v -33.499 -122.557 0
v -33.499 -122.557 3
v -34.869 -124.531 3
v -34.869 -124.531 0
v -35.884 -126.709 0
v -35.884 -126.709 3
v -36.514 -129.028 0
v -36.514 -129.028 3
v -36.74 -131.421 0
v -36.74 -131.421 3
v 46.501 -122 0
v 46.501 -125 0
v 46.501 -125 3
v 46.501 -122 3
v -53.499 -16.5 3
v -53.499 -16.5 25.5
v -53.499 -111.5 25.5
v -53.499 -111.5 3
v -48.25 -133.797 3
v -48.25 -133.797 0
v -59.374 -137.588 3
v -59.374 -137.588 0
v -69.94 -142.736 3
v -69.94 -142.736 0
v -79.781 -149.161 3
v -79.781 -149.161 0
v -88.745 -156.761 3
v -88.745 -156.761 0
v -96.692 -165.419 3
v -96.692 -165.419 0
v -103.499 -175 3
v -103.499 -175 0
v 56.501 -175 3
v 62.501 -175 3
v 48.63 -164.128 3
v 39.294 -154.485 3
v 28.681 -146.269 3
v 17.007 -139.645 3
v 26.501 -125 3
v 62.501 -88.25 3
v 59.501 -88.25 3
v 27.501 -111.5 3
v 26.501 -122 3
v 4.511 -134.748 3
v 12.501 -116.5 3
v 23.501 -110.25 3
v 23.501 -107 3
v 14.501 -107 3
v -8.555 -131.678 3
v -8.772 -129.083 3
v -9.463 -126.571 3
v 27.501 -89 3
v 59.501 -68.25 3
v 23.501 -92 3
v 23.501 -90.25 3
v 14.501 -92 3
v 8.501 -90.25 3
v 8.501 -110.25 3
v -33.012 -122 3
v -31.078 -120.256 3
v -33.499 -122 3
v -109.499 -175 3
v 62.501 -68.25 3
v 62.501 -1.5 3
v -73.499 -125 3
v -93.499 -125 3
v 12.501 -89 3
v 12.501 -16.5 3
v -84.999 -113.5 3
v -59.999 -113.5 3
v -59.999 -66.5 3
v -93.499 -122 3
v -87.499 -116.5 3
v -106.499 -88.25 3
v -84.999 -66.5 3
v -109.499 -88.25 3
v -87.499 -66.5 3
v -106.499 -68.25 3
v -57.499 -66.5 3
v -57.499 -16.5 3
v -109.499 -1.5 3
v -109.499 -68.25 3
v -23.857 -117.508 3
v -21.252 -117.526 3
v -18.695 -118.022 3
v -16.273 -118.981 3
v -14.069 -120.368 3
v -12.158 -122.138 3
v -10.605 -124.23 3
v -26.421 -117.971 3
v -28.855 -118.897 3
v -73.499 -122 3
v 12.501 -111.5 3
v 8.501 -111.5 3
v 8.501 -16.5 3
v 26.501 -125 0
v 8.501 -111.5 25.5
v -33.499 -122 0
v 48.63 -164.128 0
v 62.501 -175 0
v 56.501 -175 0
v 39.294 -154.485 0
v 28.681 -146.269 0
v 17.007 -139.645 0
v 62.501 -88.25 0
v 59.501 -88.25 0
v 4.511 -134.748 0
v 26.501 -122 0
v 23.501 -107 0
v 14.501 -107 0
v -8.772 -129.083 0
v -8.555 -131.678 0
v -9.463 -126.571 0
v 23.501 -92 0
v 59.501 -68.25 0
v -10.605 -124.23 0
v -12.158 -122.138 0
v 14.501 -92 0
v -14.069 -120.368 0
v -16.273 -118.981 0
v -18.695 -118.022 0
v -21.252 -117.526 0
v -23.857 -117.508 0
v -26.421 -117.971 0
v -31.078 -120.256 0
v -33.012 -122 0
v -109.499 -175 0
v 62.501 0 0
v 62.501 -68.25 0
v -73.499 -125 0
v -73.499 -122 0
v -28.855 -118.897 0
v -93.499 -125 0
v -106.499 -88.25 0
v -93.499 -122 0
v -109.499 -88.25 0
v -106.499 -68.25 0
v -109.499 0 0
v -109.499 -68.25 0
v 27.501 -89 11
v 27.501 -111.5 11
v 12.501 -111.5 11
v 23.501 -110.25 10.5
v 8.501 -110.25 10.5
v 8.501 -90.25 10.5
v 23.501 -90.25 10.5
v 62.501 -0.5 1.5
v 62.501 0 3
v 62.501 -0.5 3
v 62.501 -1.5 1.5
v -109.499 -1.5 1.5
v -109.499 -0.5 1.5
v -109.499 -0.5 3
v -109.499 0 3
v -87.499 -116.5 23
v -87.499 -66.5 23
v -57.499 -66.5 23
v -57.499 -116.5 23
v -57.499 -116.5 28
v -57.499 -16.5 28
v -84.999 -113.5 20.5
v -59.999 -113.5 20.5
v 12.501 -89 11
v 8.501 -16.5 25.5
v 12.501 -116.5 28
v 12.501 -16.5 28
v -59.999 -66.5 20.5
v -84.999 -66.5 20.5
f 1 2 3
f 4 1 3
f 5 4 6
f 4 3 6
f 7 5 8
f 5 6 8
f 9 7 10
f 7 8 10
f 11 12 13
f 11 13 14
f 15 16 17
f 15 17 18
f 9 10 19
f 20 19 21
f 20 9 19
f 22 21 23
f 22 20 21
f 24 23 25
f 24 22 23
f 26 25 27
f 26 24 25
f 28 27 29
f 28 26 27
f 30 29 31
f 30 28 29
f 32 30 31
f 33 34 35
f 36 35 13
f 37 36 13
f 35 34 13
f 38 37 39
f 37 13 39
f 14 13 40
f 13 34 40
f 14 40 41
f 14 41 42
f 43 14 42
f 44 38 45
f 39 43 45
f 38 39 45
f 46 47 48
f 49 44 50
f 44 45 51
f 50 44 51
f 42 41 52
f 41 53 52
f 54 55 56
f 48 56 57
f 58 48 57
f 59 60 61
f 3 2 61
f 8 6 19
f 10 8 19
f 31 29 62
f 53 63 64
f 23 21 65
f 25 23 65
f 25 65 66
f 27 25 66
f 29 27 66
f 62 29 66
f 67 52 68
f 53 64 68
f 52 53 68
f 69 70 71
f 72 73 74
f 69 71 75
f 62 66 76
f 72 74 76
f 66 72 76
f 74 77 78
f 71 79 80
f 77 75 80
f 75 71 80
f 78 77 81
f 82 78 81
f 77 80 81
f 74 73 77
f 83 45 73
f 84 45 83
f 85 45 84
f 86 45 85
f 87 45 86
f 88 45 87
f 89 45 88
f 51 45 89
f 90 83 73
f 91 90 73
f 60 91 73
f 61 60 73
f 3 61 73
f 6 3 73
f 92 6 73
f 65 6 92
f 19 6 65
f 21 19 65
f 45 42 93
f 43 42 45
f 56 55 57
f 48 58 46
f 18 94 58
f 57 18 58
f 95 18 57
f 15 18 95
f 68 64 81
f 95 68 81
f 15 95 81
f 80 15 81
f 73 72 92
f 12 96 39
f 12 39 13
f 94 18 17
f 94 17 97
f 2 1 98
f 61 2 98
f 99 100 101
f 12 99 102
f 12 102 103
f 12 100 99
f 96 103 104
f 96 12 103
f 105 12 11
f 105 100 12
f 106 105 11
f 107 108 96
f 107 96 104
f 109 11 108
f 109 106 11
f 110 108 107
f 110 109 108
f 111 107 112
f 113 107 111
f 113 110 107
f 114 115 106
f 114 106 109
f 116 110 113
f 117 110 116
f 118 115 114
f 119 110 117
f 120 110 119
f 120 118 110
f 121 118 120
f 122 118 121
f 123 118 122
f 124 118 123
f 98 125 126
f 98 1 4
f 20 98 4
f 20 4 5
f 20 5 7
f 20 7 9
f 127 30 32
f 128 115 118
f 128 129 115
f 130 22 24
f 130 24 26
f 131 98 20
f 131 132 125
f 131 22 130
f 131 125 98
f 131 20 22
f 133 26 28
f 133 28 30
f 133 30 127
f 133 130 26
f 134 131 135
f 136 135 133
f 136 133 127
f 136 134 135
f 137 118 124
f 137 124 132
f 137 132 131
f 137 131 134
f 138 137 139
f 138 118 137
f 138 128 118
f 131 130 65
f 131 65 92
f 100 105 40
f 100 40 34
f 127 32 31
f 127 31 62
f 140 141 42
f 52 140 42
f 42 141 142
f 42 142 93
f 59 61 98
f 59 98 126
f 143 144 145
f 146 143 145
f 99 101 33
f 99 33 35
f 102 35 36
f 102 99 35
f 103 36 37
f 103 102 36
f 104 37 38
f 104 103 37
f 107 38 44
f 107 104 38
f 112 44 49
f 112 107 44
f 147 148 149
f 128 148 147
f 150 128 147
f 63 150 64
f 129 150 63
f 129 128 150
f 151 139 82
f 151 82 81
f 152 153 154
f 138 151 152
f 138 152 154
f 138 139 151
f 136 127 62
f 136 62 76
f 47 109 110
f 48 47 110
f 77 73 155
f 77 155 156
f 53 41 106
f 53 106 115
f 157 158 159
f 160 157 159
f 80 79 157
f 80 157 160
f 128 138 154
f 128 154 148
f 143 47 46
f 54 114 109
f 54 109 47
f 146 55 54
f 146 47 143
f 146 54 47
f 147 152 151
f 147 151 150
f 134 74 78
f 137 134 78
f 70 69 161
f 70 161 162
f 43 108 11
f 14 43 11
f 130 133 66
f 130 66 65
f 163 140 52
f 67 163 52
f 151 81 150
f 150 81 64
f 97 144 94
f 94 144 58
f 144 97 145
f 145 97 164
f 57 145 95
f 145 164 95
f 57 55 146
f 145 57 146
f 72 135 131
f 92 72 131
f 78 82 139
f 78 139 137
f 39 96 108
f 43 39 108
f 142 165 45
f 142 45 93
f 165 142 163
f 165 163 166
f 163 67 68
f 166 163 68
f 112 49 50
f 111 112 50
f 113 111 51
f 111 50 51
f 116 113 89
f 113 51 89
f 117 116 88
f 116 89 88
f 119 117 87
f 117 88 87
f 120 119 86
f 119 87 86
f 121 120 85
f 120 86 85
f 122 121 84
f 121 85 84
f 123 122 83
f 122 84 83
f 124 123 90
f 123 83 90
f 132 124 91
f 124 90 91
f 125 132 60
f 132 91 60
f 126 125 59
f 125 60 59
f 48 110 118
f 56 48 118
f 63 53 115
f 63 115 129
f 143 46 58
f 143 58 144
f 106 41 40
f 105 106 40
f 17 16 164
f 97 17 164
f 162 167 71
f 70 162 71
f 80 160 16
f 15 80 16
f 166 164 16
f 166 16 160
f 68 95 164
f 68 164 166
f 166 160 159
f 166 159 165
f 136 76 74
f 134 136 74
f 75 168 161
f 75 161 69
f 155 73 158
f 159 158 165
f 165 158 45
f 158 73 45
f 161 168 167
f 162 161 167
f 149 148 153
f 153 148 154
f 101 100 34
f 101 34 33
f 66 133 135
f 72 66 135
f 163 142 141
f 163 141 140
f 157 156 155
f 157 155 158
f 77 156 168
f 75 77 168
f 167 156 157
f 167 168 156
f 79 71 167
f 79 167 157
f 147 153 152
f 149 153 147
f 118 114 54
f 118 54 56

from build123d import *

# Parameters (mm, degrees)
ESQUISSE1_W             = 20
ESQUISSE1_H             = 3
BOSS_EXTRU_1_DEPTH      = 3
ESQUISSE2_W             = 172
ESQUISSE2_H             = 1
ENL_V_MAT_EXTRU_1_DEPTH = 1.5
ESQUISSE4_W             = 3
ESQUISSE4_H             = 20
ENL_V_MAT_EXTRU_2_DEPTH = 207.455986147
ESQUISSE5_W             = 70
ESQUISSE5_H             = 100
BOSS_EXTRU_2_DEPTH      = 25
ESQUISSE6_W             = 62
ESQUISSE6_H             = 22.5
ENL_V_MAT_EXTRU_3_DEPTH = 95
ESQUISSE10_W            = 30
ESQUISSE10_H            = 50
BOSS_EXTRU_3_DEPTH      = 20
ESQUISSE11_W            = 25
ESQUISSE11_H            = 17.5
ENL_V_MAT_EXTRU_5_DEPTH = 47
ESQUISSE12_W            = 8
ESQUISSE12_H            = 22.5
BOSS_EXTRU_5_DEPTH      = 15
ESQUISSE15_W            = 7.5
ESQUISSE15_H            = 20
ENL_V_MAT_EXTRU_7_DEPTH = 15
ENL_V_MAT_EXTRU_8_REACH = 210.324
ESQUISSE17_W            = 9
ESQUISSE17_H            = 15
ENL_V_MAT_EXTRU_9_DEPTH = 10


with BuildPart() as part:
    # Esquisse1 → Boss.-Extru.1 (new body)
    with BuildSketch(Plane.XY):
        with BuildLine():
            Line((-109.499197329, 0), (62.500802671, 0))
            Line((62.500802671, 0), (62.500802671, -175))
            Line((62.500802671, -175), (56.500802671, -175))
            ThreePointArc((56.500802671, -175), (-23.499197329, -130.484780132), (-103.499197329, -175))
            Line((-103.499197329, -175), (-109.499197329, -175))
            Line((-109.499197329, -175), (-109.499197329, 0))
        make_face()
        with Locations((-83.499197329, -123.5)):
            Rectangle(ESQUISSE1_W, ESQUISSE1_H, mode=Mode.SUBTRACT)
        with Locations((-23.499197329, -123.5)):
            Rectangle(ESQUISSE1_W, ESQUISSE1_H, mode=Mode.SUBTRACT)
        with Locations((36.500802671, -123.5)):
            Rectangle(ESQUISSE1_W, ESQUISSE1_H, mode=Mode.SUBTRACT)
    extrude(amount=BOSS_EXTRU_1_DEPTH)

    # Esquisse2 → Enlèv. mat.-Extru.1 (cut)
    with BuildSketch(Plane.XY.offset(3)):
        with Locations((-23.499197329, -1)):
            Rectangle(ESQUISSE2_W, ESQUISSE2_H)
    extrude(amount=-ENL_V_MAT_EXTRU_1_DEPTH, mode=Mode.SUBTRACT)

    # Esquisse4 → Enlèv. mat.-Extru.2 (cut, through all)
    with BuildSketch(Plane.XY.offset(3)):
        with Locations((-107.999197329, -78.25)):
            Rectangle(ESQUISSE4_W, ESQUISSE4_H)
        with Locations((61.000802671, -78.25)):
            Rectangle(ESQUISSE4_W, ESQUISSE4_H)
    extrude(amount=-ENL_V_MAT_EXTRU_2_DEPTH, mode=Mode.SUBTRACT)

    # Esquisse5 → Boss.-Extru.2 (add)
    with BuildSketch(Plane.XY.offset(3)):
        with Locations((-22.499197329, -66.5)):
            Rectangle(ESQUISSE5_W, ESQUISSE5_H)
    extrude(amount=BOSS_EXTRU_2_DEPTH)

    # Esquisse6 → Enlèv. mat.-Extru.3 (cut)
    with BuildSketch(Plane(origin=(0, -16.5, 0), x_dir=(1, 0, 0), z_dir=(0, 1, 0))):
        with Locations((-22.499197329, -14.25)):
            Rectangle(ESQUISSE6_W, ESQUISSE6_H)
    extrude(amount=-ENL_V_MAT_EXTRU_3_DEPTH, mode=Mode.SUBTRACT)

    # Esquisse10 → Boss.-Extru.3 (add)
    with BuildSketch(Plane.XY.offset(3)):
        with Locations((-72.499197329, -91.5)):
            Rectangle(ESQUISSE10_W, ESQUISSE10_H)
    extrude(amount=BOSS_EXTRU_3_DEPTH)

    # Esquisse11 → Enlèv. mat.-Extru.5 (cut)
    with BuildSketch(Plane(origin=(0, -66.5, 0), x_dir=(1, 0, 0), z_dir=(0, 1, 0))):
        with Locations((-72.499197329, -11.75)):
            Rectangle(ESQUISSE11_W, ESQUISSE11_H)
    extrude(amount=-ENL_V_MAT_EXTRU_5_DEPTH, mode=Mode.SUBTRACT)

    # Esquisse12 → Boss.-Extru.5 (add)
    with BuildSketch(Plane(origin=(12.500802671, 0, 0), x_dir=(0, 0, -1), z_dir=(1, 0, 0))):
        with Locations((-7, -100.25)):
            Rectangle(ESQUISSE12_W, ESQUISSE12_H)
    extrude(amount=BOSS_EXTRU_5_DEPTH)

    # Esquisse15 → Enlèv. mat.-Extru.7 (cut)
    with BuildSketch(Plane.ZY.offset(-8.500802671)):
        with Locations((6.75, -100.25)):
            Rectangle(ESQUISSE15_W, ESQUISSE15_H)
    extrude(amount=-ENL_V_MAT_EXTRU_7_DEPTH, mode=Mode.SUBTRACT)

    # Esquisse17 → Enlèv. mat.-Extru.8 (cut, up to next)
    with BuildSketch(Plane(origin=(0, 0, 0), x_dir=(-1, 0, 0), z_dir=(0, 0, -1)), mode=Mode.PRIVATE) as enl_v_mat_extru_8_sk1:
        with Locations((-19.000802671, -99.5)):
            Rectangle(ESQUISSE17_W, ESQUISSE17_H)
    enl_v_mat_extru_8_tool1 = extrude(enl_v_mat_extru_8_sk1.sketch, amount=-ENL_V_MAT_EXTRU_8_REACH, mode=Mode.PRIVATE) & part.part
    add(enl_v_mat_extru_8_tool1.solids().sort_by_distance((19.000803, -99.5, 0))[0], mode=Mode.SUBTRACT)

    # Esquisse18 → Enlèv. mat.-Extru.9 (cut)
    with BuildSketch(Plane.XY.offset(3)):
        with BuildLine():
            ThreePointArc((-8.555469882, -131.678386461), (-22.519051553, -117.45703568), (-36.740402335, -131.420617351))
            Line((-36.740402335, -131.420617351), (-8.555469882, -131.678386461))
        make_face()
    extrude(amount=-ENL_V_MAT_EXTRU_9_DEPTH, mode=Mode.SUBTRACT)


solid = part.part
